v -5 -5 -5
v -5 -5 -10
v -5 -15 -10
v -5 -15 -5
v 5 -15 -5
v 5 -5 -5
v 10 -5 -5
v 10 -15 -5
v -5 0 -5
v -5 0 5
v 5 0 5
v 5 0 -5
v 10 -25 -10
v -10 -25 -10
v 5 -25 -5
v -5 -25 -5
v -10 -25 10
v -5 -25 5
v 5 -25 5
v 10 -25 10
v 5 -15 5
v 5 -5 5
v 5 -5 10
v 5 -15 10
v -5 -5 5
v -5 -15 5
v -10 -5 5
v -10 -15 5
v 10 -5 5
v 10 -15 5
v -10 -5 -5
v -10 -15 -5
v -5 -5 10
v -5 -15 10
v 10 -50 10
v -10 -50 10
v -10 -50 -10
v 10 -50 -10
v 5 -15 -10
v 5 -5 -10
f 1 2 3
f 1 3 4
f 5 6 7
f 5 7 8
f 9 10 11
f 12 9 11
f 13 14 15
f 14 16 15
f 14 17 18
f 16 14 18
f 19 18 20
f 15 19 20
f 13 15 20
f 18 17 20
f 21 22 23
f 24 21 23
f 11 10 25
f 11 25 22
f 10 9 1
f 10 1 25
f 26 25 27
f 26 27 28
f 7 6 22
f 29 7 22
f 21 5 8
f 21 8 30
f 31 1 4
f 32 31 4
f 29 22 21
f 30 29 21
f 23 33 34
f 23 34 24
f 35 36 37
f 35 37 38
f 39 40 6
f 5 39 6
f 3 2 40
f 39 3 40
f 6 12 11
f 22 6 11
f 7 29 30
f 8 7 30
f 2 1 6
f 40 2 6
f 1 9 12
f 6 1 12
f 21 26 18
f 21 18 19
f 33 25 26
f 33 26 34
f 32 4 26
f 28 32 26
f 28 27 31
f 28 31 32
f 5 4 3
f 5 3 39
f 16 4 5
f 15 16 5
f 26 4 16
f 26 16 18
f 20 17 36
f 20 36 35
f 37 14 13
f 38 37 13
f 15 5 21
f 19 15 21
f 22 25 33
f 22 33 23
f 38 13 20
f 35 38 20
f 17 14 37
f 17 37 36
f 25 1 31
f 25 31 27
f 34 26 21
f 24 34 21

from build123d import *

# Parameters (mm, degrees)
F0_W          = 10
F0_H          = 10
F1_DEPTH      = 25
F2_W          = 20
F2_H          = 20
F3_DEPTH      = 25
F4_W          = 10
F4_H          = 10
F5_DEPTH      = 5
F5_DEPTH_BACK = 15
F6_W          = 10
F6_H          = 10
F7_DEPTH      = 5
F7_DEPTH_BACK = 15


with BuildPart() as f1:
    # F0 (on Front) → F1 (new body)
    with BuildSketch(Plane.XZ):
        Rectangle(F0_W, F0_H)
    extrude(amount=F1_DEPTH)

    # F2 (on face) → F3 (join)
    with BuildSketch(Plane.XZ.offset(25)):
        Rectangle(F2_W, F2_H)
    extrude(amount=F3_DEPTH)

    # F4 (on face) → F5 (join, two sides)
    with BuildSketch(Plane.XY.offset(5)) as f5_sk:
        with Locations((0, -10)):
            Rectangle(F4_W, F4_H)
    extrude(amount=F5_DEPTH)
    extrude(f5_sk.sketch, amount=-F5_DEPTH_BACK)

    # F6 (on face) → F7 (join, two sides)
    with BuildSketch(Plane(origin=(-5, 0, 0), x_dir=(0, -1, 0), z_dir=(-1, 0, 0))) as f7_sk:
        with Locations((10, 0)):
            Rectangle(F6_W, F6_H)
    extrude(amount=F7_DEPTH)
    extrude(f7_sk.sketch, amount=-F7_DEPTH_BACK)


solid = f1.part
